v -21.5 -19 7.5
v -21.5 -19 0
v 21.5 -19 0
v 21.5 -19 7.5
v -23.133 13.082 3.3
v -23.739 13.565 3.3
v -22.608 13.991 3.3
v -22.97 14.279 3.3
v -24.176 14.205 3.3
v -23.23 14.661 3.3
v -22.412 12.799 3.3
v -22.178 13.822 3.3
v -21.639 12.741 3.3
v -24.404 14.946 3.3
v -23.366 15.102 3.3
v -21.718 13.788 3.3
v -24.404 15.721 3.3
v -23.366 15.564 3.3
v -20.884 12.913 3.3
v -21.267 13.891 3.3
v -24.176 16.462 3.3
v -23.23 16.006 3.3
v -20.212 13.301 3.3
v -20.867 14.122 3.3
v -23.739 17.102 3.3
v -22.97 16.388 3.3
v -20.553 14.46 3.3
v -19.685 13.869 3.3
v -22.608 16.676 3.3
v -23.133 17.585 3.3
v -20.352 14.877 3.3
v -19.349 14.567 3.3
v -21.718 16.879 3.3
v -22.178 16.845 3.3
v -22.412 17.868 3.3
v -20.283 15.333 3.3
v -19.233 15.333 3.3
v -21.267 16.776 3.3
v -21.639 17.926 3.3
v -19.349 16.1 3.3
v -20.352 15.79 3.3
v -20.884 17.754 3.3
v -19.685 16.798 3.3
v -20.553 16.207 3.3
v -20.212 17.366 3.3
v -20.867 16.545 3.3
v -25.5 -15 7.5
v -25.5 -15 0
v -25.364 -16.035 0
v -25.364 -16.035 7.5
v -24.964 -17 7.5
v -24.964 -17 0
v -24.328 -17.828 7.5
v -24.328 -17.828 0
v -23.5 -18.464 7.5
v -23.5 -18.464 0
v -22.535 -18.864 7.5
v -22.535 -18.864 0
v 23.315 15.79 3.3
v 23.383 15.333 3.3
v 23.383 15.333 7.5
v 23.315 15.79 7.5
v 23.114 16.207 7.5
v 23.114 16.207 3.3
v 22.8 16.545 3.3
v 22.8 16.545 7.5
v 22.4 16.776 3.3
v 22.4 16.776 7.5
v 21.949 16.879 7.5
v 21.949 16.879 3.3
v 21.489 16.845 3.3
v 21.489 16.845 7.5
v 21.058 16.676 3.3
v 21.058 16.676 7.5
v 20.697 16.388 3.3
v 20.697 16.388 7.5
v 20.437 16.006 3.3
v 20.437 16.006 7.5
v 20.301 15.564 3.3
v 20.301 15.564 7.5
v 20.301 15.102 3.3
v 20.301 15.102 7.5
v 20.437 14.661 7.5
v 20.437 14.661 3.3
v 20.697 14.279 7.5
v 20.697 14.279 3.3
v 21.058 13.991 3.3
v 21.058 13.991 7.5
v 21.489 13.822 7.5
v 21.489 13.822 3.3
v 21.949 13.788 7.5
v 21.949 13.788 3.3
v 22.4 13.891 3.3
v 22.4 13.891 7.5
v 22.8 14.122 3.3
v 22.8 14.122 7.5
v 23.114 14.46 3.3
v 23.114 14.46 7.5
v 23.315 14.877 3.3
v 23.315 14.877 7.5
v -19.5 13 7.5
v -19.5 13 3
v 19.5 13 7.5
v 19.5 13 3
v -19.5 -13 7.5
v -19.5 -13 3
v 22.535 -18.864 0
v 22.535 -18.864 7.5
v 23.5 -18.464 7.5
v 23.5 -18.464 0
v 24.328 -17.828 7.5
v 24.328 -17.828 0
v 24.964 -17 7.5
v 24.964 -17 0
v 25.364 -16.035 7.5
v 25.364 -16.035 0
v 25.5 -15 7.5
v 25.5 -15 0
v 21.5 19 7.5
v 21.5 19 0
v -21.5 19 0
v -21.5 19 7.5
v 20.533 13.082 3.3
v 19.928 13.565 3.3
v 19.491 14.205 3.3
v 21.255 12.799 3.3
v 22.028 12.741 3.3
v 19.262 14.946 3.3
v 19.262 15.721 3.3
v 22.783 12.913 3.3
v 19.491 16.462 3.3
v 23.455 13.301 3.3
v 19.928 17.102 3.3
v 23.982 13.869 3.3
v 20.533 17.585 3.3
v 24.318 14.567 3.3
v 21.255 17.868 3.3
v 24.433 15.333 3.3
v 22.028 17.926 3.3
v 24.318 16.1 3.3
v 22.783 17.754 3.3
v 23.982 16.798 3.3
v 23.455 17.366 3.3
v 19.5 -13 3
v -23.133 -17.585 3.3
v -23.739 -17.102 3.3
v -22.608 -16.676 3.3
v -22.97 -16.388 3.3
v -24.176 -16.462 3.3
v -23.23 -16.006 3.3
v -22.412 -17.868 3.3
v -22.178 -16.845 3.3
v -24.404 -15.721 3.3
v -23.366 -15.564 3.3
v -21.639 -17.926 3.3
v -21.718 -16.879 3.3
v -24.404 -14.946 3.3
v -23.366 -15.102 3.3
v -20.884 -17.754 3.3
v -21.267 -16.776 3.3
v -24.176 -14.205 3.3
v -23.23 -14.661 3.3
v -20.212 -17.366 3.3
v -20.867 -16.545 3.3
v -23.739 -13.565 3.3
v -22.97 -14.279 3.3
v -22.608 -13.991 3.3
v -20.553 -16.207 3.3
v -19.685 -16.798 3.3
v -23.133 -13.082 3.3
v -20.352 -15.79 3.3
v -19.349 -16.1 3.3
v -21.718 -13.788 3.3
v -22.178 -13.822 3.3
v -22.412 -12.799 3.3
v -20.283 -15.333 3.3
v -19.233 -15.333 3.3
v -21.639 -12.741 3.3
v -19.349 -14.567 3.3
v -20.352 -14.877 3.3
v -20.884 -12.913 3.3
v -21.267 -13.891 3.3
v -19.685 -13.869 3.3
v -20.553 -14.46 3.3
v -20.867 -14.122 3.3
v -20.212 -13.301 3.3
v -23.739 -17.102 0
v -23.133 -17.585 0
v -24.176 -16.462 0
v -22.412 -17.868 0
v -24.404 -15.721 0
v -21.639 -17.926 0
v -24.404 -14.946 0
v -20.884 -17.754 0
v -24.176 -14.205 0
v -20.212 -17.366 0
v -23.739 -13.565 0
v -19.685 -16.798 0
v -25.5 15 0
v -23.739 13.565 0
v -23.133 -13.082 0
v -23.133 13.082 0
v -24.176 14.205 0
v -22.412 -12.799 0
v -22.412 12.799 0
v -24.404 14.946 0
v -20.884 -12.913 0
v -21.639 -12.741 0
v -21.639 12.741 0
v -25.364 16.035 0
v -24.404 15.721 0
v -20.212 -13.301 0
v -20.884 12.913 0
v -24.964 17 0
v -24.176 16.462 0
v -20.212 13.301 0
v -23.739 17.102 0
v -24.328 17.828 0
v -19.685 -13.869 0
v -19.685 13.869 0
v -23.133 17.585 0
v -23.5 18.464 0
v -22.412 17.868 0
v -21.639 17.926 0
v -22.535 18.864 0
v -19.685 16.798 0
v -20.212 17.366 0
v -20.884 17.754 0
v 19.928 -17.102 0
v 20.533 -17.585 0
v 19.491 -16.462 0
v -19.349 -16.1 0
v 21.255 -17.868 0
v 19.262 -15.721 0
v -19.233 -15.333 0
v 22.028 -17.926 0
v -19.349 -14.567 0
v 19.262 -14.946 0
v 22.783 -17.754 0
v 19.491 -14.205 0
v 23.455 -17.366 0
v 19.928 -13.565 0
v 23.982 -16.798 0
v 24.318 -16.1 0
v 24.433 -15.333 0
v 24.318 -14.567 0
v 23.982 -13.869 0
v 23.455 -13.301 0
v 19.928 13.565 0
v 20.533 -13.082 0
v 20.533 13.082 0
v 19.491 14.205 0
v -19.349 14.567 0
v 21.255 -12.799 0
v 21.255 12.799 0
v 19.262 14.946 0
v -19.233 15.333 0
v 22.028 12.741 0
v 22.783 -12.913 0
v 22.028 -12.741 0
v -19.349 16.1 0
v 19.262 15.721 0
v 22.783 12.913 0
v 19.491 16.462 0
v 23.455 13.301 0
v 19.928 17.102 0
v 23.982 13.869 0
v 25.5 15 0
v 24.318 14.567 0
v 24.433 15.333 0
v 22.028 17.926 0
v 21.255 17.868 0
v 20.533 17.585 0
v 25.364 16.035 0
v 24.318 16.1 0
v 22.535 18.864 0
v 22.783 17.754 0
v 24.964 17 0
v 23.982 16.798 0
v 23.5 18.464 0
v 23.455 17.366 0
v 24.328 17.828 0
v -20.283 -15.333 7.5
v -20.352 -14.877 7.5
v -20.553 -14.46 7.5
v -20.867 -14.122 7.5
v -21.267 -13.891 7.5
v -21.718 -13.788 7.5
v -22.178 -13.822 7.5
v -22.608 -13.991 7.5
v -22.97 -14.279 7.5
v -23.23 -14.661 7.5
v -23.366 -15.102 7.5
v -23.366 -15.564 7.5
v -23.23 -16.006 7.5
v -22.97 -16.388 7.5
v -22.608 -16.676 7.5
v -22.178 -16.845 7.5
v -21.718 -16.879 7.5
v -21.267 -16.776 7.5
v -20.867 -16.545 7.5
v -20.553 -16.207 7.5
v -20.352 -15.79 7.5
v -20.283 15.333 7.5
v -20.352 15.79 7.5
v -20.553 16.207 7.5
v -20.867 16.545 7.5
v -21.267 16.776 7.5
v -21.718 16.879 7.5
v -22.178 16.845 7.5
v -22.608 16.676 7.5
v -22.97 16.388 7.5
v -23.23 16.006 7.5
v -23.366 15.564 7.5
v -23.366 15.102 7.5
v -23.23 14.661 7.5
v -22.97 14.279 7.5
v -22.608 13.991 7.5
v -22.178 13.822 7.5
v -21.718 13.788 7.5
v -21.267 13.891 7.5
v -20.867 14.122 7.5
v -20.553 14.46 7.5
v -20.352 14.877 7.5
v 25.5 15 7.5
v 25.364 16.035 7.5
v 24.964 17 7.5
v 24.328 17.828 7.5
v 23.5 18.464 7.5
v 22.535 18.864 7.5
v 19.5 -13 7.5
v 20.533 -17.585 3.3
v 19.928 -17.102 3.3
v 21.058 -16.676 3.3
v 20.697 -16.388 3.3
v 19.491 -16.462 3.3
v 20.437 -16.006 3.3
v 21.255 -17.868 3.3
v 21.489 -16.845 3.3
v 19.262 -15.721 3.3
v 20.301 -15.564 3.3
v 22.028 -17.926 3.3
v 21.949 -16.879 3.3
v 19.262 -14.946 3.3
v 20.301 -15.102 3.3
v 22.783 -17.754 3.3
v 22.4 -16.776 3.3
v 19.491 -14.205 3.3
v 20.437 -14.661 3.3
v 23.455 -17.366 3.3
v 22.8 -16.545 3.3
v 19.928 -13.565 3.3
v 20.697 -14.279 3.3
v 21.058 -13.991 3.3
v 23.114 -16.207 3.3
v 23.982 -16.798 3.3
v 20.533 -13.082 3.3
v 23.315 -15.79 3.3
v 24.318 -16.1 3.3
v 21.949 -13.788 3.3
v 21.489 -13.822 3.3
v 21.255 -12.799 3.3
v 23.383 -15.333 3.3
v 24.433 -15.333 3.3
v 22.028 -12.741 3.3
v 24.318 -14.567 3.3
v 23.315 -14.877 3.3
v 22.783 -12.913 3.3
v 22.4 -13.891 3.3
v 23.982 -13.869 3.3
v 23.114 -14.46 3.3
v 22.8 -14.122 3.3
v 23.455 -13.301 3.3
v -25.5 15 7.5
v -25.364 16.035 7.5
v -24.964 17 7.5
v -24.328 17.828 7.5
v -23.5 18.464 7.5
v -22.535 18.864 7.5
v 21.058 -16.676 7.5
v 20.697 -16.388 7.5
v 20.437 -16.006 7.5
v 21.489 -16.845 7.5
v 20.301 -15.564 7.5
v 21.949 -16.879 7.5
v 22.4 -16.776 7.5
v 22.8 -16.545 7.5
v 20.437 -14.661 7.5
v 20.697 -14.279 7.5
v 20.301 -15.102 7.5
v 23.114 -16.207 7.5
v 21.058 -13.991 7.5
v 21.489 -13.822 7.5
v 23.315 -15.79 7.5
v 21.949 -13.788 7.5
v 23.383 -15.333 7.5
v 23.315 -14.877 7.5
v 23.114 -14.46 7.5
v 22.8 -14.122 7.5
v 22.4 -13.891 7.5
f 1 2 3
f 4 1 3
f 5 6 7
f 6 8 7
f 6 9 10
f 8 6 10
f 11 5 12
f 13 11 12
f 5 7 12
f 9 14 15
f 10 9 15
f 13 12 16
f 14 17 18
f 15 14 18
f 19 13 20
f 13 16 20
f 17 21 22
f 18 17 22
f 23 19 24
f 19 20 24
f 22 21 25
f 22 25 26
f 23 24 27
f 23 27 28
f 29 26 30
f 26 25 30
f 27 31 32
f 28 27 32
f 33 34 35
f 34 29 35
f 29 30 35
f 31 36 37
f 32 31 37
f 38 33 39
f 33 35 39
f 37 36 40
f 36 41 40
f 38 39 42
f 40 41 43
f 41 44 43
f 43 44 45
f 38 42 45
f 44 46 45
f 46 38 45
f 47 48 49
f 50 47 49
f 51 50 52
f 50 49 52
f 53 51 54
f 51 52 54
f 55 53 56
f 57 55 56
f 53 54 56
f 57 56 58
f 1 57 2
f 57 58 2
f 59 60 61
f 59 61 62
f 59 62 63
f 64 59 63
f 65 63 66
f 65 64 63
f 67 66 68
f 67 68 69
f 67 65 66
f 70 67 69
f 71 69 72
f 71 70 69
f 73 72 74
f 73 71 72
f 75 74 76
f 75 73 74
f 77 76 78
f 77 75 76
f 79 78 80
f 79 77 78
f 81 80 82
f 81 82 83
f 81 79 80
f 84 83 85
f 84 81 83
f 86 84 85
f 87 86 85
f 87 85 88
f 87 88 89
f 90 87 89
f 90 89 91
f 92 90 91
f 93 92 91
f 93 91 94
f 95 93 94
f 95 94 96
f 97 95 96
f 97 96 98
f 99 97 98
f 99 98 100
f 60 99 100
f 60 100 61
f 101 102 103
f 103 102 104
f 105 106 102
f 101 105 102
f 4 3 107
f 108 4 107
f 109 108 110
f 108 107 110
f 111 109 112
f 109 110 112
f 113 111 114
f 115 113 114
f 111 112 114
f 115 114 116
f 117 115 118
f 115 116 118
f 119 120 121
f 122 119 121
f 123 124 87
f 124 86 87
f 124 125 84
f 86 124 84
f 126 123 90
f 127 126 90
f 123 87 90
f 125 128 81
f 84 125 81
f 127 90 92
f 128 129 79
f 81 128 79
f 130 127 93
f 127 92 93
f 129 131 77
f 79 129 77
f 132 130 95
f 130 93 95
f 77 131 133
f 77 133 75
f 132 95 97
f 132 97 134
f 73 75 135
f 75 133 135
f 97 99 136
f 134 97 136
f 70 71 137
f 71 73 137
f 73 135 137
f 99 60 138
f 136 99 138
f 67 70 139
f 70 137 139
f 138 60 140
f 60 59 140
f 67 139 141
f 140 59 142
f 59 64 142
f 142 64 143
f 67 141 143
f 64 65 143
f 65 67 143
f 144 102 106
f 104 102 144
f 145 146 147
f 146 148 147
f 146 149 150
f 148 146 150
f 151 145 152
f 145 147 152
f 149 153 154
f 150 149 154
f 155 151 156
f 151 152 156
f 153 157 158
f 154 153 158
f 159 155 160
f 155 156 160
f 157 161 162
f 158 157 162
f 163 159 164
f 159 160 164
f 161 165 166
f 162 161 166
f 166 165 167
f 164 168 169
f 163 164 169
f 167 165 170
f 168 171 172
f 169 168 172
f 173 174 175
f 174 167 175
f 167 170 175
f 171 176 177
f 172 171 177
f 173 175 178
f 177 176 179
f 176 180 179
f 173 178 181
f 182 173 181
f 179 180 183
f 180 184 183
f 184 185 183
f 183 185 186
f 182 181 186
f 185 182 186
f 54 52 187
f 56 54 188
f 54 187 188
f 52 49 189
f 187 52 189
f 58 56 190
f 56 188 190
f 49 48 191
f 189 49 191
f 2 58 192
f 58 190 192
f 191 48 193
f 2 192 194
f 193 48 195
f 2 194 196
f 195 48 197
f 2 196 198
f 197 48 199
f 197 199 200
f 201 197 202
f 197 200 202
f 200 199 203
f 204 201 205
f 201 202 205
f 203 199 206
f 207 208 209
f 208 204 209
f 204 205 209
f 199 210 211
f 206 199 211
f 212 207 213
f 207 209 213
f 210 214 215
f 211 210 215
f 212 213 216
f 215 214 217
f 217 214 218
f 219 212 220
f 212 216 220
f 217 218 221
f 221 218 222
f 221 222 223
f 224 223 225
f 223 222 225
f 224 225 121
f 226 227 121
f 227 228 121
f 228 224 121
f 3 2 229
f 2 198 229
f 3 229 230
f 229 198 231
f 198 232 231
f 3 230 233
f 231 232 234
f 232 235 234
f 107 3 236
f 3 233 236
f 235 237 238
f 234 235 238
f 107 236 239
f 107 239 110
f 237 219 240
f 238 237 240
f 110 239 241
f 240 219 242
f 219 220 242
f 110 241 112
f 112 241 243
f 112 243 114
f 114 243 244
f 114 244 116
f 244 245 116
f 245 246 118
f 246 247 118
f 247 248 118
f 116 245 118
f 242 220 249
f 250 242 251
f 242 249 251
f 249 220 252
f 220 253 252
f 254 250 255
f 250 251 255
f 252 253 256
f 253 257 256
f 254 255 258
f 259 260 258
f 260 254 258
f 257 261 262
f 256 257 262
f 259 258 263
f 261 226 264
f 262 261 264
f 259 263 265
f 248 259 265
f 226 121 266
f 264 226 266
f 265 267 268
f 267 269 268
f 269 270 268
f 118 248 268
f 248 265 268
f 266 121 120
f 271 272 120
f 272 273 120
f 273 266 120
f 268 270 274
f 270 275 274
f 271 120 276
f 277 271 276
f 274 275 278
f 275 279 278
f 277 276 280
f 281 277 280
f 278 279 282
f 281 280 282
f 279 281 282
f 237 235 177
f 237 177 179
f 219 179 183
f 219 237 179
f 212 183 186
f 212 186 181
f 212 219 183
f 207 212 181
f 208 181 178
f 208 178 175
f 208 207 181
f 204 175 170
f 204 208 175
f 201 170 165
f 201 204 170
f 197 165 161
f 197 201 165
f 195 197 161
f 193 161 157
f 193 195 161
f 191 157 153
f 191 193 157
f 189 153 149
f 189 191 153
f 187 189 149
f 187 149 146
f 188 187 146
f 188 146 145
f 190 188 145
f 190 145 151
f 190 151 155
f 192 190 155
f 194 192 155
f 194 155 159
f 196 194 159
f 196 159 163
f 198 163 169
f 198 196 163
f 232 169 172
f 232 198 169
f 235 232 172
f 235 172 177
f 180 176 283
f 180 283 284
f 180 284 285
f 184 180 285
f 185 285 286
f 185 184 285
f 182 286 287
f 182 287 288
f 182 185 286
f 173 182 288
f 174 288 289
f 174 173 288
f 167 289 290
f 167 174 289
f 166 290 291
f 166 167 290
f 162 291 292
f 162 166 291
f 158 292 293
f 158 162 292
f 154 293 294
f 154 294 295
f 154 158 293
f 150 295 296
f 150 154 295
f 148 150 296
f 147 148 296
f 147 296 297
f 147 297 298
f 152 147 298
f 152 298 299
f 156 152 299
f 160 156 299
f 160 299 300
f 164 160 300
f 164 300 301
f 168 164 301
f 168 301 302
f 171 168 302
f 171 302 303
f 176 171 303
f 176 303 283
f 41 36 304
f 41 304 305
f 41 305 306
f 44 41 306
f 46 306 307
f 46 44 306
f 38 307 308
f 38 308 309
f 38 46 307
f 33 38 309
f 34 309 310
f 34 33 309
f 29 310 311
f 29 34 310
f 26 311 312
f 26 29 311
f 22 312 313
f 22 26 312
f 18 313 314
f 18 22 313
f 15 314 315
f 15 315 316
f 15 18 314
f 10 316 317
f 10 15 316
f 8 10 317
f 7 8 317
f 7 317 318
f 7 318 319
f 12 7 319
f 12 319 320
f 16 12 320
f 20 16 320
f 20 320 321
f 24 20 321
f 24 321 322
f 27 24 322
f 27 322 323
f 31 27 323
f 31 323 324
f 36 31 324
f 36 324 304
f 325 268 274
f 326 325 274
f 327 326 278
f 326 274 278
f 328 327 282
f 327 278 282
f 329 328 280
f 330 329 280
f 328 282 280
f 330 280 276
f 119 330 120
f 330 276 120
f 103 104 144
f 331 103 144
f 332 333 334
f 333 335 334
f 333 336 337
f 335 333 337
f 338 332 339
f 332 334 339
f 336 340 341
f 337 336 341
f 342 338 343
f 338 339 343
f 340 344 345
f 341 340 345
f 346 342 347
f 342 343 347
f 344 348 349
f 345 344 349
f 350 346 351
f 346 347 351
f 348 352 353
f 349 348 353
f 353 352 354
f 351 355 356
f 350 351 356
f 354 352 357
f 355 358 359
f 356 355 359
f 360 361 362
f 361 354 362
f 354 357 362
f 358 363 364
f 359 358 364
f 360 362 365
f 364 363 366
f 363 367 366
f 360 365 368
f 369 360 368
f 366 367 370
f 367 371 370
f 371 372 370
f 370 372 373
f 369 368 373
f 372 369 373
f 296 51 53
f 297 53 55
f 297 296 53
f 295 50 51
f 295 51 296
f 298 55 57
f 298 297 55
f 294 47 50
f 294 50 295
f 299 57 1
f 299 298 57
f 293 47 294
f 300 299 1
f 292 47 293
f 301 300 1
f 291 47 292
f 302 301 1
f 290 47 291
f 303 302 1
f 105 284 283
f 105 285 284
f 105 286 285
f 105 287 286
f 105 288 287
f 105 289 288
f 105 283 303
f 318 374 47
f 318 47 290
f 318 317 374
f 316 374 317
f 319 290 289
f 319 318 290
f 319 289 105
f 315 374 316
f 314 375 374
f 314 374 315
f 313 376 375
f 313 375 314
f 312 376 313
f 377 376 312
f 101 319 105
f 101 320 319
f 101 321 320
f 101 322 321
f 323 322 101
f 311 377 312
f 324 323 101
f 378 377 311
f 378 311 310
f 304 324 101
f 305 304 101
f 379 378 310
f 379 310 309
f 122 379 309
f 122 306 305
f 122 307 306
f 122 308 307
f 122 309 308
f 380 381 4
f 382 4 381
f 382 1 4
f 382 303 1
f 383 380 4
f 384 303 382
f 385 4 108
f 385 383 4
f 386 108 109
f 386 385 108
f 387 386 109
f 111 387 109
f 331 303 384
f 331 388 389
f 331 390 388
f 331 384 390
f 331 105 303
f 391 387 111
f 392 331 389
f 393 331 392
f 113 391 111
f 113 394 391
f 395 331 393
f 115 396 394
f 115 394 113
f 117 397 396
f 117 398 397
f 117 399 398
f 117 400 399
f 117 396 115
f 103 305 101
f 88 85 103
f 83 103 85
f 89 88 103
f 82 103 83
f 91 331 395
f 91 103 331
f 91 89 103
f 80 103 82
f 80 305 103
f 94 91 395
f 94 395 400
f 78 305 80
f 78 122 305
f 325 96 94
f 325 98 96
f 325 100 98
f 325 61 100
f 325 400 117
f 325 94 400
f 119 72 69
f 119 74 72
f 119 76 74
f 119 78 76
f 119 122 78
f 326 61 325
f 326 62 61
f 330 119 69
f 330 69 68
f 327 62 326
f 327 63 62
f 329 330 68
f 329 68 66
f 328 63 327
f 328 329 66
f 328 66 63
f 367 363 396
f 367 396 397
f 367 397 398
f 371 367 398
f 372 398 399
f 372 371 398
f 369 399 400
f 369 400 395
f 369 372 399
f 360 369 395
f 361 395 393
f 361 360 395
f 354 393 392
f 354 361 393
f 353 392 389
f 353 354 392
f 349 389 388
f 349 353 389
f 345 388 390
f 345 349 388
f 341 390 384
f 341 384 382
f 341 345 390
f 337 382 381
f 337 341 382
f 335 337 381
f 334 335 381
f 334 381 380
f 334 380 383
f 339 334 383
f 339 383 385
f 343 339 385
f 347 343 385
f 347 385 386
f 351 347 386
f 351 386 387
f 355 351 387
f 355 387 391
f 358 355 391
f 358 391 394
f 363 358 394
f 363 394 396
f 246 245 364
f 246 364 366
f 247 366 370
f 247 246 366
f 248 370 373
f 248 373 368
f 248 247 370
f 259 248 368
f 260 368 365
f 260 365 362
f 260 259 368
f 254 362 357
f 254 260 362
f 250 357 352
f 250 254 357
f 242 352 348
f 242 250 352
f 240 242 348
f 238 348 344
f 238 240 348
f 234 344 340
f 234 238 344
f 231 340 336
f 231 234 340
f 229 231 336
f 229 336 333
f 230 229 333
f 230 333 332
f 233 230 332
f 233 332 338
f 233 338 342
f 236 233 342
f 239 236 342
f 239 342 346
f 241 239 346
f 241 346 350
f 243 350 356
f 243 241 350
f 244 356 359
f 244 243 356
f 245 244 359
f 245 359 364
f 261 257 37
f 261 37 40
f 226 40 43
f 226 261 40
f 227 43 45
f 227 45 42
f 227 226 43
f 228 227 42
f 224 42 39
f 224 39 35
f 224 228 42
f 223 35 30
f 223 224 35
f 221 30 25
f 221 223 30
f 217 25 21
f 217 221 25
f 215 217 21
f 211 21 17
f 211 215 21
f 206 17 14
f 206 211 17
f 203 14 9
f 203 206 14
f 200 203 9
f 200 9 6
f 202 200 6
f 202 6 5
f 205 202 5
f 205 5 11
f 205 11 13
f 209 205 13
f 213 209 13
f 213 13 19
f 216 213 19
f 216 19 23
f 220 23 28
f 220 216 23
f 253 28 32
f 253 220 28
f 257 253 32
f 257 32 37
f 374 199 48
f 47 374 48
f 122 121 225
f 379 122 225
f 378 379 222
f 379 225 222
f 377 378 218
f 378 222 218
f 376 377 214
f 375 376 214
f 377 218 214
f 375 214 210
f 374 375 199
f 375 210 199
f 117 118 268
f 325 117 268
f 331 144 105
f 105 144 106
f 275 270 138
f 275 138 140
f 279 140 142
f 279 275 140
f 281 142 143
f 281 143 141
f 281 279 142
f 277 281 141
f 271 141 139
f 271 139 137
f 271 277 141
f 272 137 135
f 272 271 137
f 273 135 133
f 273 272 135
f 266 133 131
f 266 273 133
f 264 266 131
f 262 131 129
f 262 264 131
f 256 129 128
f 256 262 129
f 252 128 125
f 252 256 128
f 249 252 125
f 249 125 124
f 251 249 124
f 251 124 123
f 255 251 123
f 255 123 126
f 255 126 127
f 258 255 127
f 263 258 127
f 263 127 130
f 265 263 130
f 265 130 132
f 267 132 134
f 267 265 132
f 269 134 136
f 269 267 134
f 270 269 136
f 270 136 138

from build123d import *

# Parameters (mm, degrees)
F1_DEPTH = 3
F0_R     = 2.6
F0_W     = 13.2
F0_H     = 6
F0_W_2   = 2
F0_W_3   = 5.6
F0_H_2   = 8.5
F0_W_4   = 0.4
F0_H_3   = 2.75
F0_R_2   = 1.55
F2_DEPTH = 7.5
F3_DEPTH = 3.3


with BuildPart() as f1:
    # F0 (on Top) → F1 (new body)
    with BuildSketch(Plane.XY):
        Polygon((19.5, 13), (9.5, 13), (-3.7, 13), (-5.7, 13), (-18.9, 13), (-19.5, 13), (-19.5, -13), (-18.9, -13), (-5.7, -13), (-3.7, -13), (9.5, -13), (19.5, -13), (19.5, -7), (19.5, -4.25), (19.5, 4.25), (19.5, 7), align=None)
    extrude(amount=F1_DEPTH)

    # F0 (on Top) → F2 (join)
    with BuildSketch(Plane.XY):
        with BuildLine():
            Line((-18.9, 13), (-18.9, 19))
            Line((-18.9, 19), (-21.5, 19))
            ThreePointArc((-21.5, 19), (-24.3284271247, 17.8284271247), (-25.5, 15))
            Line((-25.5, 15), (-25.5, -15))
            ThreePointArc((-25.5, -15), (-24.3284271247, -17.8284271247), (-21.5, -19))
            Line((-21.5, -19), (-18.9, -19))
            Line((-18.9, -19), (-18.9, -13))
            Line((-18.9, -13), (-19.5, -13))
            Line((-19.5, -13), (-19.5, 13))
            Line((-19.5, 13), (-18.9, 13))
        make_face()
        with Locations((-21.8334523779, -15.3334523779)):
            Circle(F0_R, mode=Mode.SUBTRACT)
        with Locations((-21.8334523779, 15.3334523779)):
            Circle(F0_R, mode=Mode.SUBTRACT)
        with Locations((-12.3, -16)):
            Rectangle(F0_W, F0_H)
        with Locations((-4.7, -16)):
            Rectangle(F0_W_2, F0_H)
        with Locations((2.9, -16)):
            Rectangle(F0_W, F0_H)
        with BuildLine():
            Line((25.5, -15), (25.5, -7))
            Line((25.5, -7), (25.1, -7))
            Line((25.1, -7), (19.5, -7))
            Line((19.5, -7), (19.5, -13))
            Line((19.5, -13), (9.5, -13))
            Line((9.5, -13), (9.5, -19))
            Line((9.5, -19), (21.5, -19))
            ThreePointArc((21.5, -19), (24.3284271247, -17.8284271247), (25.5, -15))
        make_face()
        with Locations((21.8334523779, -15.3334523779)):
            Circle(F0_R, mode=Mode.SUBTRACT)
        with Locations((22.3, 0)):
            Rectangle(F0_W_3, F0_H_2)
        with Locations((25.3, -5.625)):
            Rectangle(F0_W_4, F0_H_3)
        with Locations((22.3, -5.625)):
            Rectangle(F0_W_3, F0_H_3)
        with Locations((25.3, 0)):
            Rectangle(F0_W_4, F0_H_2)
        with Locations((22.3, 5.625)):
            Rectangle(F0_W_3, F0_H_3)
        with Locations((25.3, 5.625)):
            Rectangle(F0_W_4, F0_H_3)
        with BuildLine():
            ThreePointArc((25.5, 15), (24.3284271247, 17.8284271247), (21.5, 19))
            Line((21.5, 19), (9.5, 19))
            Line((9.5, 19), (9.5, 13))
            Line((9.5, 13), (19.5, 13))
            Line((19.5, 13), (19.5, 7))
            Line((19.5, 7), (25.1, 7))
            Line((25.1, 7), (25.5, 7))
            Line((25.5, 7), (25.5, 15))
        make_face()
        with Locations((21.8334523779, 15.3334523779)):
            Circle(F0_R, mode=Mode.SUBTRACT)
        with Locations((2.9, 16)):
            Rectangle(F0_W, F0_H)
        with Locations((-4.7, 16)):
            Rectangle(F0_W_2, F0_H)
        with Locations((-12.3, 16)):
            Rectangle(F0_W, F0_H)
        with Locations((-21.8334523779, 15.3334523779)):
            Circle(F0_R)
        with Locations((-21.8334523779, 15.3334523779)):
            Circle(F0_R_2, mode=Mode.SUBTRACT)
        with Locations((-21.8334523779, -15.3334523779)):
            Circle(F0_R)
        with Locations((-21.8334523779, -15.3334523779)):
            Circle(F0_R_2, mode=Mode.SUBTRACT)
        with Locations((21.8334523779, -15.3334523779)):
            Circle(F0_R)
        with Locations((21.8334523779, -15.3334523779)):
            Circle(F0_R_2, mode=Mode.SUBTRACT)
        with Locations((21.8334523779, 15.3334523779)):
            Circle(F0_R)
        with Locations((21.8334523779, 15.3334523779)):
            Circle(F0_R_2, mode=Mode.SUBTRACT)
    extrude(amount=F2_DEPTH)

    # F0 (on Top) → F3 (cut)
    with BuildSketch(Plane.XY):
        with Locations((-21.8334523779, -15.3334523779)):
            Circle(F0_R)
        with Locations((-21.8334523779, -15.3334523779)):
            Circle(F0_R_2, mode=Mode.SUBTRACT)
        with Locations((21.8334523779, -15.3334523779)):
            Circle(F0_R)
        with Locations((21.8334523779, -15.3334523779)):
            Circle(F0_R_2, mode=Mode.SUBTRACT)
        with Locations((21.8334523779, 15.3334523779)):
            Circle(F0_R)
        with Locations((21.8334523779, 15.3334523779)):
            Circle(F0_R_2, mode=Mode.SUBTRACT)
        with Locations((-21.8334523779, 15.3334523779)):
            Circle(F0_R)
        with Locations((-21.8334523779, 15.3334523779)):
            Circle(F0_R_2, mode=Mode.SUBTRACT)
    extrude(amount=F3_DEPTH, mode=Mode.SUBTRACT)


solid = f1.part
